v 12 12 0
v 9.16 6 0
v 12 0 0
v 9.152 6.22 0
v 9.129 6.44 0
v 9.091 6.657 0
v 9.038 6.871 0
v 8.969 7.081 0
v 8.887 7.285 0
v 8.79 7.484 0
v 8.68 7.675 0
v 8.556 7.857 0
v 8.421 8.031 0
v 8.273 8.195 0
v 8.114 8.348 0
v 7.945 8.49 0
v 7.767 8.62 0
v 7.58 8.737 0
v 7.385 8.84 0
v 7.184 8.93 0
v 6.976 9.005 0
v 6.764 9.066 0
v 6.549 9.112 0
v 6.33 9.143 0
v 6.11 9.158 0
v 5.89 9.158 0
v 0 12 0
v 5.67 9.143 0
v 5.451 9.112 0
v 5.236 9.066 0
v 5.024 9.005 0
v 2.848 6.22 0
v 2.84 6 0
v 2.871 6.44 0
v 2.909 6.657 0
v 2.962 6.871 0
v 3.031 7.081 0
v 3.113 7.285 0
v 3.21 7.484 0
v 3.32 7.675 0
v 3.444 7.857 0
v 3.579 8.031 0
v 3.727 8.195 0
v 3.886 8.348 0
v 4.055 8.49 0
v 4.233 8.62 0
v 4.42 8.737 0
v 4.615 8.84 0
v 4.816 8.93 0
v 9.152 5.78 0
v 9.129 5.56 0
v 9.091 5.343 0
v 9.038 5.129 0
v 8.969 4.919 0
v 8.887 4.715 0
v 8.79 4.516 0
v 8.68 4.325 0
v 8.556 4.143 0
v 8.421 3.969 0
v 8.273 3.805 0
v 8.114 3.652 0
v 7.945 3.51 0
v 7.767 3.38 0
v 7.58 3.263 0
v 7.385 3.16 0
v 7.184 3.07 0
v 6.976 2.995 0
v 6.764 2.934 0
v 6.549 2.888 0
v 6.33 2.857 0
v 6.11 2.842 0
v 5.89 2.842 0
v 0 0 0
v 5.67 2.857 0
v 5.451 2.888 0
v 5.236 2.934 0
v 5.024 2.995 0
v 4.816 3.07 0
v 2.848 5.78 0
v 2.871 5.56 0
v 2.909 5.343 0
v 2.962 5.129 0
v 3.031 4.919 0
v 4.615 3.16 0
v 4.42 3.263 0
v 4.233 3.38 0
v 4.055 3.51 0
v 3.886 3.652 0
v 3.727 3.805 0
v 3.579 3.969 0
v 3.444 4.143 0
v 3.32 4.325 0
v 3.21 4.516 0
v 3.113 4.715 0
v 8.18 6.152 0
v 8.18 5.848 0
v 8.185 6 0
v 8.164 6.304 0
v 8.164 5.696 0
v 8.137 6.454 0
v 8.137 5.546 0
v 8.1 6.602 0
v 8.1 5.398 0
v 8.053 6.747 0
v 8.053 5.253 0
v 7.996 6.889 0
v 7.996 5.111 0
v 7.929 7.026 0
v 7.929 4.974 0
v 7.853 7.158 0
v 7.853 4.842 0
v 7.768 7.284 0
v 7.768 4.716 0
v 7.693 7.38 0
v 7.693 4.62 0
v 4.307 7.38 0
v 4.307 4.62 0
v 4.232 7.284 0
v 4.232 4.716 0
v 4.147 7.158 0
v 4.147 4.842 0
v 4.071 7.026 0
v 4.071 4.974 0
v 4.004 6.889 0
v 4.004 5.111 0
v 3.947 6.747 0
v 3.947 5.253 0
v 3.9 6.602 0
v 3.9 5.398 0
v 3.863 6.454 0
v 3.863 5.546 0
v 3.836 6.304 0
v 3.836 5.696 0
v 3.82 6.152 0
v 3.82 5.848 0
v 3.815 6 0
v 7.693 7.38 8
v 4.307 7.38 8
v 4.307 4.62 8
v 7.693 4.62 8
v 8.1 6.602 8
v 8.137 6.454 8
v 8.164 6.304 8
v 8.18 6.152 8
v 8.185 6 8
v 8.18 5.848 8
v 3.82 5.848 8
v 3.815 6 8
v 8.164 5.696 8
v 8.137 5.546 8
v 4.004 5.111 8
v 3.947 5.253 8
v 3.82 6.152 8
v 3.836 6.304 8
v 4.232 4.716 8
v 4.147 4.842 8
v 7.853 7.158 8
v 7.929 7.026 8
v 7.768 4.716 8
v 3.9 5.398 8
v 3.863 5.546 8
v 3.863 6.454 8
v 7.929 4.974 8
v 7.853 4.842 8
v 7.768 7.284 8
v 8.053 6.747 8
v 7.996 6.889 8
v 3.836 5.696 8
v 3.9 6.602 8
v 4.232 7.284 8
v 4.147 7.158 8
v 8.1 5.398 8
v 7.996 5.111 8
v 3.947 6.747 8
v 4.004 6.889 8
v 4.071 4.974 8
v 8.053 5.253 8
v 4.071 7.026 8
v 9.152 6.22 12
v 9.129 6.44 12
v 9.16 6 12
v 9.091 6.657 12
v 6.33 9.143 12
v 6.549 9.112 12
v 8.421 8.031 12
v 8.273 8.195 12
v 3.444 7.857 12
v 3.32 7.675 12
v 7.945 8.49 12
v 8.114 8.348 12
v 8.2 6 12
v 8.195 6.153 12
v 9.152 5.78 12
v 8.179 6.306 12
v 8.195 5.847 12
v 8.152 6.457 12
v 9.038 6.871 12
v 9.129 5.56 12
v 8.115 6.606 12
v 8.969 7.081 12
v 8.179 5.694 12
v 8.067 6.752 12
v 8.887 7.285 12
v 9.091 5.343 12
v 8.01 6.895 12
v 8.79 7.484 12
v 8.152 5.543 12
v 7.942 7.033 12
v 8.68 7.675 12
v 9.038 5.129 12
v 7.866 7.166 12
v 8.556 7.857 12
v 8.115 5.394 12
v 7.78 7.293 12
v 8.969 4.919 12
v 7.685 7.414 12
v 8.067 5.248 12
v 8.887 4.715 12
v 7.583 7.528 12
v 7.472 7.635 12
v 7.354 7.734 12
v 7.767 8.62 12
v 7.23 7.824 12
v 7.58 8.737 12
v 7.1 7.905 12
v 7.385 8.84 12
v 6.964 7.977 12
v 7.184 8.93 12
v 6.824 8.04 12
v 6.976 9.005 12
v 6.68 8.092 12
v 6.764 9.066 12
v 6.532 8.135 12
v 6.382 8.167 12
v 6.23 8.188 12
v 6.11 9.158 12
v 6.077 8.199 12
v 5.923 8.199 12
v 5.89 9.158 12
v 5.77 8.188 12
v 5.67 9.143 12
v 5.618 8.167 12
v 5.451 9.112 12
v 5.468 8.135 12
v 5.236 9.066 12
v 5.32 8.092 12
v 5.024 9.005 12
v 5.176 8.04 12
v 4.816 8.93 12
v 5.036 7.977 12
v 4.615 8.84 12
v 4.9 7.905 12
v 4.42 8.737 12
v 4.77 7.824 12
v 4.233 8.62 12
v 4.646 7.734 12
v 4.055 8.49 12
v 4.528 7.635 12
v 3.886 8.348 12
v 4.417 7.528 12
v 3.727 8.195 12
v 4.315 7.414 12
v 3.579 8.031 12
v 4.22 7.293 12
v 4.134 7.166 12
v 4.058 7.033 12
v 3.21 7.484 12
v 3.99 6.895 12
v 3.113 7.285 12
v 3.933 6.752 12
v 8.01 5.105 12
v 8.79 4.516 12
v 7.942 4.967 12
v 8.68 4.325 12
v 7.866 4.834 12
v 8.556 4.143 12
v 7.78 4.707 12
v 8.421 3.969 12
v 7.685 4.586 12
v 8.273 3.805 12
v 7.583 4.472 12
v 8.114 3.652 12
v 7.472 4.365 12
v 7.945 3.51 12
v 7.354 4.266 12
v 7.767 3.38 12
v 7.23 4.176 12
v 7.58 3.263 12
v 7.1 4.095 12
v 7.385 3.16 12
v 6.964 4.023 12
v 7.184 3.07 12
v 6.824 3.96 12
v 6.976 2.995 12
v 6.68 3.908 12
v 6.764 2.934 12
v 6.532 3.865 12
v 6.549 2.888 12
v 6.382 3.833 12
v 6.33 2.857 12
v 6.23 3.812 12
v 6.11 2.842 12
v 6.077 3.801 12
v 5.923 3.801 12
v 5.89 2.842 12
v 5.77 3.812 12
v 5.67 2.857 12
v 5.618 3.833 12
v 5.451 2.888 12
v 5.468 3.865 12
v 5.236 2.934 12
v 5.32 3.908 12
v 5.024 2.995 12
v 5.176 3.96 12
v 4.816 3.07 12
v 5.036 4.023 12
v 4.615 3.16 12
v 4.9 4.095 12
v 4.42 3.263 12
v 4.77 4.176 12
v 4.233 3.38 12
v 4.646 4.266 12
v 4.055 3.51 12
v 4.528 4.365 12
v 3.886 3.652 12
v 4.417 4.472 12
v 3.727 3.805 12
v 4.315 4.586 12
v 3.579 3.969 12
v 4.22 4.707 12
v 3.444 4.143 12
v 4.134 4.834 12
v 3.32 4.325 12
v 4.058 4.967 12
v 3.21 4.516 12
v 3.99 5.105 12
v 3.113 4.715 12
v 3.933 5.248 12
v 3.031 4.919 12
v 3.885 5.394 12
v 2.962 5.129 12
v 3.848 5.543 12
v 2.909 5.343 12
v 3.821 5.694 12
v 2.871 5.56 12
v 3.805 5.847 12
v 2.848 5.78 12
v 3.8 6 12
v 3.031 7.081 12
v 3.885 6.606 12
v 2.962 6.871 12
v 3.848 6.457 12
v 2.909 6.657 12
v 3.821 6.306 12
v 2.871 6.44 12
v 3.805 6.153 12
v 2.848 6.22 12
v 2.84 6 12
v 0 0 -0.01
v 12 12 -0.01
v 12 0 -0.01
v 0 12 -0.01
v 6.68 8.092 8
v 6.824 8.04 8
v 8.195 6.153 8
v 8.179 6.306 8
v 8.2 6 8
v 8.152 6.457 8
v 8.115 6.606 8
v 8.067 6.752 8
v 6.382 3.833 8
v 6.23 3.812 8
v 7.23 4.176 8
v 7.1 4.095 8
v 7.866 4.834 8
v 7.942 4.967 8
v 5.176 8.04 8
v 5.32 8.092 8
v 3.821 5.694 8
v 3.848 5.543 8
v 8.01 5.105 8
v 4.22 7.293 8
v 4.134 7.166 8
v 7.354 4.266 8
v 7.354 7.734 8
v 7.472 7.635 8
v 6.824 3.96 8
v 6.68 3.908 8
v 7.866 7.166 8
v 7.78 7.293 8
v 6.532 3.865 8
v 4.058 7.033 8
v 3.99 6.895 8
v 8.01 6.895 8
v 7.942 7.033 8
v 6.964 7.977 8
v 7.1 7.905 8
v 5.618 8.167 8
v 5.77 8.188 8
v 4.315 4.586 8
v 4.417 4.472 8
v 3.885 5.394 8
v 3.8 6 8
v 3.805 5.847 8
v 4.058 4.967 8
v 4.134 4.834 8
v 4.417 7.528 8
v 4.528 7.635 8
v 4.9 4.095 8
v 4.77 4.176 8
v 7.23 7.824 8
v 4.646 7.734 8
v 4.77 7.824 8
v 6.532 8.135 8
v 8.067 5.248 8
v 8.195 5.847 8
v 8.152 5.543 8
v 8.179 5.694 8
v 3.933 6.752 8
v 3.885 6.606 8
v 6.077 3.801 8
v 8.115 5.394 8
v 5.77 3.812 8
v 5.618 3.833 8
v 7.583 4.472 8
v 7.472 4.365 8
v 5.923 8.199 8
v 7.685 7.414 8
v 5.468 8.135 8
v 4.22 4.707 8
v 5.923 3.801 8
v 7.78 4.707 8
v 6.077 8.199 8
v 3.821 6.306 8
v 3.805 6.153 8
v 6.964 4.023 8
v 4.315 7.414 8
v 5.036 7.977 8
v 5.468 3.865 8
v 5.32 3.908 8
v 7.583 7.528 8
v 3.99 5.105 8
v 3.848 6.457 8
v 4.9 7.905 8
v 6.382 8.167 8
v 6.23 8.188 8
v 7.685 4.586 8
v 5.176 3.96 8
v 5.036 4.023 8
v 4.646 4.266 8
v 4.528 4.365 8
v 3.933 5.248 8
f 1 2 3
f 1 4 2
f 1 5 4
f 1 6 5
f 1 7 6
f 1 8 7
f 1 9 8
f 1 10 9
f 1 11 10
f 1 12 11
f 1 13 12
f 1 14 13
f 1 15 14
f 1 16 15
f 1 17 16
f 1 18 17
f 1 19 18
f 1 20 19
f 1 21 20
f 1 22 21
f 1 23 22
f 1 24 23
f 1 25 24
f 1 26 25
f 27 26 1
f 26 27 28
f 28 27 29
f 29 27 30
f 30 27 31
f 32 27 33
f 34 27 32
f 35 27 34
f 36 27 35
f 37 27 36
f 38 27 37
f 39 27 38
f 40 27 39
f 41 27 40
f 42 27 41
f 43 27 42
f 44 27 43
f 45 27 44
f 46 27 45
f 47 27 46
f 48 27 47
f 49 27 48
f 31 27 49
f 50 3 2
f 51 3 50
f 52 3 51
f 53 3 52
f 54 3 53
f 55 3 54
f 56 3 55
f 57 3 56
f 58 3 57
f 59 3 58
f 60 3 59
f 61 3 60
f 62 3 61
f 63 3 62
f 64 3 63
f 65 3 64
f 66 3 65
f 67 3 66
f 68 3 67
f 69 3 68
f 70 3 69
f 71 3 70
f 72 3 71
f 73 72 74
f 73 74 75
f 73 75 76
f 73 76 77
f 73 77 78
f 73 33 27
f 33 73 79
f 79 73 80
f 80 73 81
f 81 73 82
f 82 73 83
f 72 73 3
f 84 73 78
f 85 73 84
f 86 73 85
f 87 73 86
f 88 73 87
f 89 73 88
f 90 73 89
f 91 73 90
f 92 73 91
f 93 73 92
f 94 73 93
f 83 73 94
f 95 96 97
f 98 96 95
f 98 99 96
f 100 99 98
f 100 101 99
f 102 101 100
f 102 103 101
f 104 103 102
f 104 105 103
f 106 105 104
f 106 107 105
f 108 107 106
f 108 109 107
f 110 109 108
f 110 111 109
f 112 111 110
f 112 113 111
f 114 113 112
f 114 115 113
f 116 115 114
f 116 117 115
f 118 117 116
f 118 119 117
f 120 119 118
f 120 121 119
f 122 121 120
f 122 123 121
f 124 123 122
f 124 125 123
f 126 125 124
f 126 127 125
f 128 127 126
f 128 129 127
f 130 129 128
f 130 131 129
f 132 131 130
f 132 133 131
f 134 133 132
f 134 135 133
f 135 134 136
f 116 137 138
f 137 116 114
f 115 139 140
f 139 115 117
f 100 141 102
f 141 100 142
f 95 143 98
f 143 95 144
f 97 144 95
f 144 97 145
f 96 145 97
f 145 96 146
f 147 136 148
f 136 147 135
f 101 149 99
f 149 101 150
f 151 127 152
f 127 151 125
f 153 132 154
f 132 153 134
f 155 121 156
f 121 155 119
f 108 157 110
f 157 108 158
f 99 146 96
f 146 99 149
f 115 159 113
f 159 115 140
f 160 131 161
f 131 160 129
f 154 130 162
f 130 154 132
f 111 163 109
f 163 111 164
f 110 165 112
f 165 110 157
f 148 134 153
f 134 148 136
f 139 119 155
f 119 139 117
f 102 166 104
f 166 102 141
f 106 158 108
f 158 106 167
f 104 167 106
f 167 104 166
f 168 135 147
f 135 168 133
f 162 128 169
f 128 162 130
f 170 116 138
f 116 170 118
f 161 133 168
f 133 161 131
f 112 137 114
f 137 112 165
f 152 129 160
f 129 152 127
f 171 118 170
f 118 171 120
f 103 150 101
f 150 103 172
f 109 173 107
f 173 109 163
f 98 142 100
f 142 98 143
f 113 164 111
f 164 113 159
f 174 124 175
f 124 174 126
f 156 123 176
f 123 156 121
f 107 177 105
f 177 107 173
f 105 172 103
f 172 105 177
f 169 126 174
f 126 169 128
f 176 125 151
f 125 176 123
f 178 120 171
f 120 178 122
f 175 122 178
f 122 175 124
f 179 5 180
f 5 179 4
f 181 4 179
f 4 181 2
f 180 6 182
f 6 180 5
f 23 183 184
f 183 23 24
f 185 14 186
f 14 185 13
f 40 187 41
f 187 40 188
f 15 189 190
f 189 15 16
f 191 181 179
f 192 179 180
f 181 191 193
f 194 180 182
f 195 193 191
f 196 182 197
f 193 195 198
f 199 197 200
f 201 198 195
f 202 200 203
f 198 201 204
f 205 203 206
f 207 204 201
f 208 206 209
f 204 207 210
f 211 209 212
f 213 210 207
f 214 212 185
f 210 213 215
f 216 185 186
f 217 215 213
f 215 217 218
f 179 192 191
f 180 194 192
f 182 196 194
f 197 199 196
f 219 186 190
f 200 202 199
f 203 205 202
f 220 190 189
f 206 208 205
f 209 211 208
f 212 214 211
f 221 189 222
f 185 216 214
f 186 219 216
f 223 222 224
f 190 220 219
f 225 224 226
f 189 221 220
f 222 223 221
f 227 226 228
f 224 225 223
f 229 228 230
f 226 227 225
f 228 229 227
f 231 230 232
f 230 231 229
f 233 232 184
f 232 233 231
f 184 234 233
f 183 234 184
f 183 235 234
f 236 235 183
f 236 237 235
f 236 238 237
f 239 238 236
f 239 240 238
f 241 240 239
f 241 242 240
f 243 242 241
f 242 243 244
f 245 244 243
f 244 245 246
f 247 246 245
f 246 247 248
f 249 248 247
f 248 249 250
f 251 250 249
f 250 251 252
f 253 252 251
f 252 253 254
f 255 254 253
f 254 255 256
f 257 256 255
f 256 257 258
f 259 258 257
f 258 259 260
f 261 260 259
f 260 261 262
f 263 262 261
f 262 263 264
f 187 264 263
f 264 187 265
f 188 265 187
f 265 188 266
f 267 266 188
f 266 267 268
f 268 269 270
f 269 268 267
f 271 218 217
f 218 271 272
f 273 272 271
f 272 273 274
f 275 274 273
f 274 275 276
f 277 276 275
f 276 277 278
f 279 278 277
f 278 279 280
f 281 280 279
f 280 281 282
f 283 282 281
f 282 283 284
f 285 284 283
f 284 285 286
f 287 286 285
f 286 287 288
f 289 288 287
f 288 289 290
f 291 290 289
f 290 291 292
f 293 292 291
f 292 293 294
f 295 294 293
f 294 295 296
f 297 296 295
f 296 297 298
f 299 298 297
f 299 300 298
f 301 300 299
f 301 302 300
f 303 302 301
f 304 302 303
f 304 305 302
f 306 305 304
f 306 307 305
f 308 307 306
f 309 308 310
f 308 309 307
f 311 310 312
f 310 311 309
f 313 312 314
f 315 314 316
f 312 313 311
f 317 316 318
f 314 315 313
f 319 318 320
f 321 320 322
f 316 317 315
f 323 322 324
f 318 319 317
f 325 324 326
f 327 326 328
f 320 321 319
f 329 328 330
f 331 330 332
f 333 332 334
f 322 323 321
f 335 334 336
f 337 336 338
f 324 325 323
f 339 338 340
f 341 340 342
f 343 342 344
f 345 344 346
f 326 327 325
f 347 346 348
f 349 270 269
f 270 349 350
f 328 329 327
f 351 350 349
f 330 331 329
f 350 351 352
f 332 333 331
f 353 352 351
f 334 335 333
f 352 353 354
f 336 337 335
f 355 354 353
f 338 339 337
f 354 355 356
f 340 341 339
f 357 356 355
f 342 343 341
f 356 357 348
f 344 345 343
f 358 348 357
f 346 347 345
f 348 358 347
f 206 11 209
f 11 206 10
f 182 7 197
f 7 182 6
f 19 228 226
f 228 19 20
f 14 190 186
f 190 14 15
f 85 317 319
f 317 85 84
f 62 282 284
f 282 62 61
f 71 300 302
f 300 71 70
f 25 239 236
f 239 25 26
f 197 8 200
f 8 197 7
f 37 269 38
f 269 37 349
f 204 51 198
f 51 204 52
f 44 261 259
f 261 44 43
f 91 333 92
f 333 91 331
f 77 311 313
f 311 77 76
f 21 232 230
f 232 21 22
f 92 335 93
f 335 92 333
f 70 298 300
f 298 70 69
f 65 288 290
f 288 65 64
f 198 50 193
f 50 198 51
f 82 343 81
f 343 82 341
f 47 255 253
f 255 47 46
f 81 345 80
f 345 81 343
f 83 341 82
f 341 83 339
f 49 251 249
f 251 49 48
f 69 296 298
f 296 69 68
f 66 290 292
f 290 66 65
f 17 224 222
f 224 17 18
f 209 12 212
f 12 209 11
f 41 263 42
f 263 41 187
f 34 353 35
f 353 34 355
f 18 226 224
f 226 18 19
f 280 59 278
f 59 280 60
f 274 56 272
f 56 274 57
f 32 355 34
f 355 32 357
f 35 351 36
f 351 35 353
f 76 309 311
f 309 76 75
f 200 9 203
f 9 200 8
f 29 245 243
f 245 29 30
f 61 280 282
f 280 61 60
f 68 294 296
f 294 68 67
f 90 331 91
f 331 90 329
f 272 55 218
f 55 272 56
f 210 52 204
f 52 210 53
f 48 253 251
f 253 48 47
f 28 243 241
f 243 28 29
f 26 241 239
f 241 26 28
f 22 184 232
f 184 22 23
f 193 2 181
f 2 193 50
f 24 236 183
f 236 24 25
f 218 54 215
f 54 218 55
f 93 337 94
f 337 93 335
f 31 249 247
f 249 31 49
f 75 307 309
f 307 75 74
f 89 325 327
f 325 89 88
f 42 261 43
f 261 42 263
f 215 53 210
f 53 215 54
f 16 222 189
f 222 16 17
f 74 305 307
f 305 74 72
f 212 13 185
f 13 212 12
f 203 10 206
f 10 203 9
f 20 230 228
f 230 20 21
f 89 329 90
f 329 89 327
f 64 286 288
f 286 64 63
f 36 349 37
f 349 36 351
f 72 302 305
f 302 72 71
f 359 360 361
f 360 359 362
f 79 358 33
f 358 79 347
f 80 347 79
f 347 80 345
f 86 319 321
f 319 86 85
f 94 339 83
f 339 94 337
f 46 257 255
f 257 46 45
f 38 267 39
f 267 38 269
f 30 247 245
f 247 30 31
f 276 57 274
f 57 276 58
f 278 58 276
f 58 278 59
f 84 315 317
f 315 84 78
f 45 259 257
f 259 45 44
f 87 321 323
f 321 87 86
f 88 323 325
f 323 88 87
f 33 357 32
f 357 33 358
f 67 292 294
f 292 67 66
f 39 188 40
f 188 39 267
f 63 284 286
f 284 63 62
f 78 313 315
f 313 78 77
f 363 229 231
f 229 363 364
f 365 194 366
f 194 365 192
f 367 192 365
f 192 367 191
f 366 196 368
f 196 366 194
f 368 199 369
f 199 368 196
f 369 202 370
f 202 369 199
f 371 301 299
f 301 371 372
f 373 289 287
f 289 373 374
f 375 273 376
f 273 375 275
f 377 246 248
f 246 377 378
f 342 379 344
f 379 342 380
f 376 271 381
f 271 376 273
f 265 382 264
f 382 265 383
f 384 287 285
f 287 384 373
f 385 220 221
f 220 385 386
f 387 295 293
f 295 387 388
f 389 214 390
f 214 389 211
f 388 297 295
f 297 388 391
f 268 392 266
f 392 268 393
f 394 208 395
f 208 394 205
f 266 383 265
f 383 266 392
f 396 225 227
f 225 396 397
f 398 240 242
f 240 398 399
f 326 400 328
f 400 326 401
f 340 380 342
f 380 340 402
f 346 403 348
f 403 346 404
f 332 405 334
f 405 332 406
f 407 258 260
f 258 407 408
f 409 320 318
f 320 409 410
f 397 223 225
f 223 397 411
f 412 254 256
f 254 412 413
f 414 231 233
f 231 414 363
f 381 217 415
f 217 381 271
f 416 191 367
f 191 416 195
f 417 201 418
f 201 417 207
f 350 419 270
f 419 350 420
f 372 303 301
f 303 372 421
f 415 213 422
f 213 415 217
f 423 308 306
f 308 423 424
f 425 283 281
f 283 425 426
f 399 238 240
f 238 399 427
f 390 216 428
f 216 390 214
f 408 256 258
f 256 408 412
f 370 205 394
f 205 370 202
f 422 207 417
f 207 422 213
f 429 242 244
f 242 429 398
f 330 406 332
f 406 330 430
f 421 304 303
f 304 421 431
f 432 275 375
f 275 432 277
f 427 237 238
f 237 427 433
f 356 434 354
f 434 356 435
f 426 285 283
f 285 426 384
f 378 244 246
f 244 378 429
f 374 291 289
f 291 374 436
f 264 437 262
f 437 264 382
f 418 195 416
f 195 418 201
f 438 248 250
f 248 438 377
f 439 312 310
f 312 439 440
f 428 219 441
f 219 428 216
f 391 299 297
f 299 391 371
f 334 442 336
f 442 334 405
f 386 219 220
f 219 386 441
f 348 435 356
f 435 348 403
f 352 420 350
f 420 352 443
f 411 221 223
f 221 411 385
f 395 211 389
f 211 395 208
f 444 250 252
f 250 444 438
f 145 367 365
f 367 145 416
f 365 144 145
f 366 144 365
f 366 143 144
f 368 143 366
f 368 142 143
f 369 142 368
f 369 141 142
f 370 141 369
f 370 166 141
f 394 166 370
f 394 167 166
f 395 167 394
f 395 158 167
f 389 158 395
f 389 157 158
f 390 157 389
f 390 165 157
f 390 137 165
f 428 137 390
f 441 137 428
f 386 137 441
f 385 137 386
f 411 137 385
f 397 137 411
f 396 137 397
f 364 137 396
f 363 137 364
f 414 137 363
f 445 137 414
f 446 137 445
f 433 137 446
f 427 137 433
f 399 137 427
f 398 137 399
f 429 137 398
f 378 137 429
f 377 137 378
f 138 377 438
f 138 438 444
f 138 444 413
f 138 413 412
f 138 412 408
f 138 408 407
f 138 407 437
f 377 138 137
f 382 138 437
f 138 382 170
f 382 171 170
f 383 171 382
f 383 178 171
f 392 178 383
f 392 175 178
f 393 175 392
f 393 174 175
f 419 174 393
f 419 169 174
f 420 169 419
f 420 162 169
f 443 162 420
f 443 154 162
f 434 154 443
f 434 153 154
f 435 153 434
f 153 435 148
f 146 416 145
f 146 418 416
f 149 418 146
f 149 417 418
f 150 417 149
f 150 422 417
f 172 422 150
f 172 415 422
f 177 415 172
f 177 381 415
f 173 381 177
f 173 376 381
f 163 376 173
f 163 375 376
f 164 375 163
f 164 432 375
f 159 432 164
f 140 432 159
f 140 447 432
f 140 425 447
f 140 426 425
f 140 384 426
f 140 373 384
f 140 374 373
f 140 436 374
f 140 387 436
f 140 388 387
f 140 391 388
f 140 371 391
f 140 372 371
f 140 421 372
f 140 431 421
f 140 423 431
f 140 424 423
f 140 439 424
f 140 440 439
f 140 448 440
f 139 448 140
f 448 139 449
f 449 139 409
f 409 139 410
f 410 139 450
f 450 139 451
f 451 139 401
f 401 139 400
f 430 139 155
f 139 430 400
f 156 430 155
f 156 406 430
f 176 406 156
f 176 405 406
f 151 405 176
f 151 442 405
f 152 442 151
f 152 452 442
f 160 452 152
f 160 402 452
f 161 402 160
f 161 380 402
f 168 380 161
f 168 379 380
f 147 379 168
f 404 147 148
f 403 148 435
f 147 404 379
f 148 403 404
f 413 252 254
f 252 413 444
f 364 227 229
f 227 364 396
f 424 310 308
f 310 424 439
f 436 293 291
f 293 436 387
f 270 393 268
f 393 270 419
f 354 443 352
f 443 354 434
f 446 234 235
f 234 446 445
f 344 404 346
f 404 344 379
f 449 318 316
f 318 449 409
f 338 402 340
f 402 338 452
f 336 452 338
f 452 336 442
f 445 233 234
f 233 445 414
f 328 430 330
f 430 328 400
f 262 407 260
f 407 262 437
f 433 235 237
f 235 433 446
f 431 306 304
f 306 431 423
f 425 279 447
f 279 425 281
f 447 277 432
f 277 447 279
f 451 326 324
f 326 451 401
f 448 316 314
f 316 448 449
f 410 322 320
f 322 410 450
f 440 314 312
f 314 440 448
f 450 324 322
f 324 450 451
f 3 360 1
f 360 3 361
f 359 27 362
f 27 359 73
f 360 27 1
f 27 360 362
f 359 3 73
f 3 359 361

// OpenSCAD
// file: ../Base/PlacementOptions.scad
// Fischertechnik Box Foundation
// Placement Options

// Alignment
NoAlign = 0;
AlignLeft = 1;
AlignBottom = 2;
AlignCenter = 3;
AlignRight = 4;
AlignTop = 5;

// Element rotation degree steps
rotations = [0, -90, -180, -270];

// Rotation
NoRotation = 0;
Rotate0 = 0;
Rotate90 = 1;
Rotate180 = 2;
Rotate270 = 3;

// Docking (seen from above)
NoDock = -1;
DockLeft = 0;
DockTop = 1;
DockRight = 2;
DockCorner = 2;
DockBottom = 3;

// Web corners
LowerLeft = 0;
UpperLeft = 1;
UpperRight = 2;
LowerRight = 3;

// Web position relative to corner
LeftOfCorner = 0;
RightOfCorner = 1;

// Rails direction
Horizontal = true;
Vertical = false;
// file: ../Base/Boxes.scad
// Fischertechnik Box Foundation
// Pre-designed Boxes

use <Constants.scad>

include <PlacementOptions.scad>

box190Width = 190;
box190Depth = 130;
box130Width = 130;
box130Depth = 95;

// Values are from an original ec3 box
topBottomDifference = 1.5;
outerHeight = 40;
baseThickness = 1.8;
innerHeight = outerHeight - baseThickness;
stackExcess = 5.7;
radius = 3.5;
wallThickness = 1.5;
tolerance = 0.2;

boxWallThickness = wallThickness;
boxBaseThickness = baseThickness;
boxWebWidth = 3.0;

// getBoxWallThickness()
// Gets the wall thickness of a Fischertechnik Box
function getBoxWallThickness() = boxWallThickness;

// getBoxUsageHeight(height = 38.2)
// Gets the usable height of a Fischertechnik box
// height = Outer height of the box from the bottom to the upper edge.
function getBoxUsageHeight(height = outerHeight) = height - baseThickness - stackExcess;

// getBoxInnerHeight()
// Gets the inner height of a Fischertechnik box, including the stack excess
function getBoxInnerHeight() = innerHeight;

// getBoxBaseThickness()
// Gets the thickness of the Fischertechnik box base.
function getBoxBaseThickness() = boxBaseThickness;

// getBoxWebWidth()
// Gets the width of a box web
function getBoxWebWidth() = boxWebWidth;

// getBox190Space()
// Gets the usable inner space of a Box 190 as an x/y-list
function getBox190Space() = [
    box190Width - 2*getBoxWallThickness() - topBottomDifference, 
    box190Depth - 2*getBoxWallThickness() - topBottomDifference ];

// RoundedCornerPlate(width, depth, height, radius)
// Creates a body plate with rounded corners for a box. Used
// also to create the complete box with the hull module.
// width = Width of the plate
// depth = depth of the plate 
// height = thickness of the plate
// radius = radius of the rounded corner
module RoundedCornerPlate(width, depth, height, radius) {
    translate([radius, radius])
    hull() {
        w = width-2*radius;
        d = depth-2*radius;
        cube([w, d, height]);
        cylinder(height, r=radius, $fn=getFragments());
        translate([w, 0])
            cylinder(height, r=radius, $fn=getFragments());
        translate([w, d])
            cylinder(height, r=radius, $fn=getFragments());
        translate([0, d])
            cylinder(height, r=radius, $fn=getFragments());
    }
}

// BoxBase(width, depth)
// Creates an empty stackable Fischertechnik compatible box
// width = Outer width of the box (190, 130, ...)
// depth = Outer depth of the box (130, 95, ...)

module BoxBase(width, depth, height=outerHeight) {    
    thinPlate = 0.01;

    innerHeight = height - baseThickness;    
    
    module Body(tolerance=tolerance) {
        hull() {
            // Bottom with tolerance to fit into the original boxes when stacked
            translate([-wallThickness+tolerance, -wallThickness+tolerance, -baseThickness])
                RoundedCornerPlate(width-topBottomDifference-2*tolerance, depth-topBottomDifference-2*tolerance, thinPlate, radius);
            
            // Top
            translate([-wallThickness-topBottomDifference/2, -wallThickness-topBottomDifference/2, innerHeight-thinPlate])
                RoundedCornerPlate(width, depth, thinPlate, radius);
         }
    }

    module Cutoff() {
        hull() {
            coWidth = width - 2*wallThickness;
            coDepth = depth - 2*wallThickness;
            
            // Bottom
            RoundedCornerPlate(coWidth-topBottomDifference, coDepth-topBottomDifference, thinPlate, radius);

            // Top
            translate([-topBottomDifference/2, -topBottomDifference/2, innerHeight+thinPlate]) 
                RoundedCornerPlate(coWidth, coDepth, thinPlate, radius);
        }
    }
    
    difference() {        
        Body();
        Cutoff();
        stackOffset = innerHeight - stackExcess;
        translate([0, 0, stackOffset + baseThickness])
            Body(tolerance=0);
    }
}

// Creates the Fischertechnik empty box 130x190 mm and places it at position 0,0
// 190x130 are the outer sizes, the inner space is slightly smaller. Use getBox190Space() to get the inner sizes.
// The box is positioned that the usable inner space is at the 0,0,0 position.

module Box190() {
    BoxBase(box190Width, box190Depth);
}

// Gets the usable inner space of a Box 130 as an x/y-list
function getBox130Space() = [
    box130Width - 2*getBoxWallThickness() - topBottomDifference, 
    box130Depth - 2*getBoxWallThickness() - topBottomDifference ];

// Creates the Fischertechnik empty box 95x130 mm and places it at position 0,0
// 190x130 are the outer sizes, the inner space is slightly smaller. Use getBox190Space() to get the inner sizes.
// The box is positioned that the usable inner space is at the 0,0,0 position.

module Box130() {
    BoxBase(box130Width, box130Depth);
}

// Creates a web at the specified box walls
// corner 0 = LowerLeft, 1 = UpperLeft, 2 = UpperRight, 3 = LowerRight
// side 0 = LeftOfCorner, 1 = RightOfCorner
// distance = Distance in mm from the corner
// boxSpace = inner width and depth of the box (default: Box 190)
// webWidth = length of the web (default is 3 mms)
// webThickness = thickness of the web (default is 1 mm)
// height = Height of the web (standard is getBoxUsageHeight())
// sink = How much of the web is sunk into the wall

module BoxWeb(
    corner, 
    side, 
    distance, 
    boxSpace=getBox190Space(), 
    webWidth=getBoxWebWidth(), 
    webThickness=1.0, 
    height=getBoxUsageHeight(),
    sink = getBoxWallThickness()/2) {
    width = (corner % 2 == 0) ? 
            (side == LeftOfCorner ? webWidth : webThickness) :
            (side == LeftOfCorner ? webThickness : webWidth);

    depth = (corner % 2 == 0) ? 
            (side == RightOfCorner ? webWidth : webThickness) :
            (side == RightOfCorner ? webThickness : webWidth);
    
    xDiff = corner == LowerLeft ? 
                (side == LeftOfCorner ? -sink : distance) :
            (corner == UpperLeft ?                
                (side == LeftOfCorner ? distance : -sink) :
            (corner == UpperRight ?
                (side == LeftOfCorner ? boxSpace.x-webWidth+sink : boxSpace.x-distance-webThickness) :
                (side == LeftOfCorner ? boxSpace.x-distance-webThickness: boxSpace.x-webWidth+sink)));

    yDiff = corner == LowerLeft ? 
                (side == RightOfCorner ? -sink : distance) :
            (corner == UpperLeft ?
                (side == RightOfCorner ? boxSpace.y-distance-webThickness : boxSpace.y-webWidth+sink) :
            (corner == UpperRight ?
                (side == RightOfCorner ? boxSpace.y-webWidth+sink : boxSpace.y-distance-webThickness) :
                (side == RightOfCorner ? distance : -sink)));
    
    translate([xDiff, yDiff, -getExcess()])
        cube([width, depth, height + 2*getExcess()]);
}
// file: ../Base/Rotation.scad
// Fischertechnik Box Foundation
// Geometry Helpers Rotation

include <PlacementOptions.scad>

// getRotatedSpace(space, rotation=NoRotation)
// Rotates the space dependent on the specified rotation

function getRotatedSpace(space, rotation=NoRotation) = [
    (rotation == Rotate90 || rotation == Rotate270) ? space.y : space.x,
    (rotation == Rotate90 || rotation == Rotate270) ? space.x : space.y
];

// Rotates the given space around the fixed left lower corner
// space = the space the children needs as width/depth list [width,depth]
// rotation = 0 Rotate0 degrees, 1 Rotate90 degrees, 2 Rotate180 degrees, 3 Rotate270 degrees (equivalent to -90)

module RotateFix(space, rotation=NoRotation) {
    dy = (rotation == Rotate0 || rotation == Rotate270) ? 0 :
        (rotation == Rotate90) ? space.x :
        space.y;
    dx = (rotation < Rotate180) ? 0 :
        (rotation == Rotate180) ? space.x :
        space.y;
    
    translate([dx, dy, 0])
        rotate([0, 0, rotations[rotation]])
            children();
}
// file: ../Base/Alignment.scad
// Fischertechnik Box Foundation
// Geometry Helpers Alignment

include <PlacementOptions.scad>

// getAlignedX(elementWidth, spaceWidth, align=AlignRight, offset=0)
// Gets the aligned X offset of an element with the given
// width in the given space.
// elementWidth = The width of the element to positon
// spaceWidth = The space where the element should be aligned
// align = 0 AlignLeft, 1 AlignCenter, 2 AlignRight
// offset = an optional offset from the aligned position. When
// aligned left or centered, then positive values are in X direction.
// When aligned right then positive values are in negative X direction.

function getAlignedX(elementWidth, spaceWidth, align=AlignRight, offset=0) =
    (align == AlignLeft) ?
        offset :
        ((align == AlignCenter) ?
        (spaceWidth - elementWidth)/2 + offset :
        spaceWidth - offset - elementWidth);

// getAlignedY(elementDepth, spaceDepth, align=AlignTop, offset=0)
// Gets the aligned Y offset of an element with the given
// depth in the given space.
// elementDepth = The depth of the element to positon
// spaceDepth = The space where the element should be aligned
// align = 0 AlignBottom, 1 AlignCenter, 2 AlignTop
// offset = an optional offset from the aligned position. When
// aligned bottom or centered, then positive values are in Y direction.
// When aligned top then positive values are in negative Y direction.

function getAlignedY(elementDepth, spaceDepth, align=AlignTop, offset=0) =
    (align == AlignBottom) ?
        offset :
        ((align == AlignCenter) ?
        (spaceDepth - elementDepth)/2 + offset :
        spaceDepth - offset - elementDepth);
// file: ../Base/Placement.scad
// Fischertechnik Box Foundation
// Geometry Helpers Placement

use <Constants.scad>
use <Alignment.scad>
use <Rotation.scad>
use <Boxes.scad>

include <PlacementOptions.scad>

// Place(x=0, y=0, elementSpace=[0,0], alignX=AlignLeft, alignY=AlignBottom, rotation=Rotate0, boxSpace=getBox190Space())
// Places the child at the specified position
// y = Y-Position. This is a relative position when an X aligment is specified.
// x = X-Position. This is a relative position when an Y aligment is specified.
// elementSpace = space of the element to be placed [x,y]
// alignX = -1=NoAlign, 0 AlignLeft, 1 AlignCenter, 3 AlignRight (elementSpace and boxSpace required!)
// alignY = -1=NoAlign, 2 AlignBottom, 1 AlignCenter, 4 AlignTop (elementSpace and boxSpace required!)
// rotation = 0 Rotate0 0 degrees, 1 Rotate90 90 degrees, 
// 2 Rotate180 180 degrees, 3 Rotate270 270 degrees (equivalent to -90)
// boxSpace = Inner space of the box where the placement occurs [x,y] - default is Box 190x130 inner space

module Place(x=0, y=0, elementSpace=[0,0], 
  alignX=AlignLeft, alignY=AlignBottom, 
  rotation=NoRotation, boxSpace=getBox190Space()) {

    module Position(x, y, space, rotation=Rotate0) {
        translate([x, y, 0])
            RotateFix(space, rotation)
                children();
    }

    space = getRotatedSpace(elementSpace, rotation);
    alignedX = getAlignedX(space.x, boxSpace.x, alignX, x);
    alignedY = getAlignedY(space.y, boxSpace.y, alignY, y);
    Position(alignedX, alignedY, elementSpace, rotation)
        children();
}

// Center(space=getBox130Space(), elementSpace=[0,0])
// space = Space where the children is centered. For cylinder use centered=true and no elementSpace.
// elementSpace = space of the element to be centered [x,y]

module Center(space=getBox190Space(), elementSpace=[0,0]) {
    Place(elementSpace=elementSpace, boxSpace=space, alignX=AlignCenter, alignY=AlignCenter)
        children();
}

// CenterHorizontal(width=0, y=0, offset=0, space=getBox130Space())
// width = Width of the element to be placed.
// y = Y position of the element
// offset = Offset from the center position (negative will be left of the center)
// space = Space where the element is placed

module CenterHorizontal(width=0, y=0, offset=0, space=getBox190Space()) {
    Place(x=offset, y=y, elementSpace=[width, 0], boxSpace=space, alignX=AlignCenter)
        children(0);
}

// CenterVertical(depth=0, x=0, offset=0, space=getBox130Space())
// depth = Depth of the element to be placed.
// x = X position of the element
// offset = Offset from the center position (negative will be down of the center)
// space = Space where the element is placed

module CenterVertical(depth=0, x=0, offset=0, space=getBox190Space()) {
    Place(x=x, y=offset, elementSpace=[0, depth], boxSpace=space, alignY=AlignCenter)
        children(0);
}

// getIsVertical(align)
// True if the specified alignment needs a vertical orientation for a divider (AlignRight, AlignLeft)

function getIsVertical(align) = (align == AlignRight || align == AlignLeft);

// getIsHorizontal(align)
// True if the specified alignment needs a horizontal orientation for a divider (AlignTop, AlignBottom)

function getIsHorizontal(align) = (align == AlignTop || align == AlignBottom);
// file: ../Base/Constants.scad
// Fischertechnik Box Foundation
// Constants

// Constant values necessary for multiple elements

// Base constants
dividerThickness = 1.2;
excess = 0.01;
fragments = 90;
tolerance = 0.8;

// Gets the thickness of a divider 
function getDividerThickness() = dividerThickness;

// Gets the excess that is used to merge walls into each other
function getExcess() = excess;

// Gets amount of fragments of a cylinder
function getFragments() = fragments;

// Gets the inner tolerance of a frame to each side
function getTolerance() = tolerance;


// Fischertechnik specific constants
axisDiameter = 4;
axisBottomDiameter = axisDiameter + 1;
axisTolerance = 0.2;
axisLockingLength = 8;

// Gets axis diameter of Fischertechnik axis
function getAxisDiameter() = axisDiameter;

// Gets axis diameter tolerance (subtracted for element axis)
function getAxisTolerance() = axisTolerance;

// Gets the axis diameter for standing axis
function getStandAxisDiameter() = getAxisDiameter() - getAxisTolerance();

// Gets axis bottom diameter for thicker part at the bottom
function getAxisBottomDiameter() = axisBottomDiameter;

// Gets the lengthh of the locking part of a locking axis
function getAxisLockingLength() = axisLockingLength;

// Studs

studHeight = 2.5;
studTolerance = 0.2;
studRailDistance = 9;   // as in ft 50

// gets the height of a connecting stud
function getStudHeight() = studHeight;

// gets the connecting stud height tolerance
function getStudTolerance() = studTolerance;

// gets the default rail distance for studs
function getStudRailDistance() = studRailDistance;

// Dockable Frame with Edge

standardEdgeDistance = 2.5;
standardWebDistance = 11.5;
standardCornerLength = 15;

// gets the standard distance to the wall of the box for dockable frames with webs
function getStandardEdgeDistance() = standardEdgeDistance;

// gets the standard distance of each web to the corner of the dockable frame
function getStandardWebDistance() = standardWebDistance;

// gets the standard length of the corner walls of a dockable frame
function getStandardCornerLength() = standardCornerLength;

// Tubes

tubeWallFactor = 0.8;

// gets the wall thickness of a tube.
function getTubeWallThickness() = tubeWallFactor * getDividerThickness();

// Small Parts and Divider Frame

smallPartsFrameHeight = 20;

// gets the frame height for docked small parts boxes.
function getSmallPartsFrameHeight() = smallPartsFrameHeight;

// Hubs

hubRingDiameter = 19.5;
hubRingLevelDiameter = 21;

// gets the diameter of a tube matching the inner ring of a wheel
function getHubRingDiameter() = hubRingDiameter;

// gets the diameter of a hub tube with a thicker diameter
function getHubRingLevelDiameter() = hubRingLevelDiameter;

// Struts

strutAddLength = 9.0;
strutDepth = 8.0;

// gets the full length of a strut
function getFullStrutLength(length) = length + strutAddLength;

// gets the radius of the end of a strut
function getStrutEndRadius() = strutAddLength / 2;

// gets the the depth of a strut
function getStrutDepth() = strutDepth;

// Propeller

propellerAxisDiameter = 7.0;
propellerAxisTolerance = 0.2;

// gets the propeller axis outer diameter
function getPropellerAxisDiameter() = propellerAxisDiameter;

// gets the propeller axis printing tolerance
function getPropellerAxisTolerance() = propellerAxisTolerance;
// main file
// Fischertechnik Box Library
// Cylinder for standing locking bevel gear
// 35061

use <../Base/Constants.scad>
use <../Base/Placement.scad>
use <../ModelBase/Simple.scad>

/* [Hidden] */
width = 12;
depth = 12;
height = 12;

// getCylinderLockingBevelGearSpace()
// Gets the space the cylinder for a locking bevel gear

function getCylinderLockingBevelGearSpace() = [width, depth, height];

// CylinderLockingBevelGear()
// Standing cylinder for a locking bevel gear
// 35061

module CylinderLockingBevelGear() {
    Space(getCylinderLockingBevelGearSpace());
    
    Center(getCylinderLockingBevelGearSpace())
        LockingTube(height);
}

// Tests
color("lightgray")
CylinderLockingBevelGear();
